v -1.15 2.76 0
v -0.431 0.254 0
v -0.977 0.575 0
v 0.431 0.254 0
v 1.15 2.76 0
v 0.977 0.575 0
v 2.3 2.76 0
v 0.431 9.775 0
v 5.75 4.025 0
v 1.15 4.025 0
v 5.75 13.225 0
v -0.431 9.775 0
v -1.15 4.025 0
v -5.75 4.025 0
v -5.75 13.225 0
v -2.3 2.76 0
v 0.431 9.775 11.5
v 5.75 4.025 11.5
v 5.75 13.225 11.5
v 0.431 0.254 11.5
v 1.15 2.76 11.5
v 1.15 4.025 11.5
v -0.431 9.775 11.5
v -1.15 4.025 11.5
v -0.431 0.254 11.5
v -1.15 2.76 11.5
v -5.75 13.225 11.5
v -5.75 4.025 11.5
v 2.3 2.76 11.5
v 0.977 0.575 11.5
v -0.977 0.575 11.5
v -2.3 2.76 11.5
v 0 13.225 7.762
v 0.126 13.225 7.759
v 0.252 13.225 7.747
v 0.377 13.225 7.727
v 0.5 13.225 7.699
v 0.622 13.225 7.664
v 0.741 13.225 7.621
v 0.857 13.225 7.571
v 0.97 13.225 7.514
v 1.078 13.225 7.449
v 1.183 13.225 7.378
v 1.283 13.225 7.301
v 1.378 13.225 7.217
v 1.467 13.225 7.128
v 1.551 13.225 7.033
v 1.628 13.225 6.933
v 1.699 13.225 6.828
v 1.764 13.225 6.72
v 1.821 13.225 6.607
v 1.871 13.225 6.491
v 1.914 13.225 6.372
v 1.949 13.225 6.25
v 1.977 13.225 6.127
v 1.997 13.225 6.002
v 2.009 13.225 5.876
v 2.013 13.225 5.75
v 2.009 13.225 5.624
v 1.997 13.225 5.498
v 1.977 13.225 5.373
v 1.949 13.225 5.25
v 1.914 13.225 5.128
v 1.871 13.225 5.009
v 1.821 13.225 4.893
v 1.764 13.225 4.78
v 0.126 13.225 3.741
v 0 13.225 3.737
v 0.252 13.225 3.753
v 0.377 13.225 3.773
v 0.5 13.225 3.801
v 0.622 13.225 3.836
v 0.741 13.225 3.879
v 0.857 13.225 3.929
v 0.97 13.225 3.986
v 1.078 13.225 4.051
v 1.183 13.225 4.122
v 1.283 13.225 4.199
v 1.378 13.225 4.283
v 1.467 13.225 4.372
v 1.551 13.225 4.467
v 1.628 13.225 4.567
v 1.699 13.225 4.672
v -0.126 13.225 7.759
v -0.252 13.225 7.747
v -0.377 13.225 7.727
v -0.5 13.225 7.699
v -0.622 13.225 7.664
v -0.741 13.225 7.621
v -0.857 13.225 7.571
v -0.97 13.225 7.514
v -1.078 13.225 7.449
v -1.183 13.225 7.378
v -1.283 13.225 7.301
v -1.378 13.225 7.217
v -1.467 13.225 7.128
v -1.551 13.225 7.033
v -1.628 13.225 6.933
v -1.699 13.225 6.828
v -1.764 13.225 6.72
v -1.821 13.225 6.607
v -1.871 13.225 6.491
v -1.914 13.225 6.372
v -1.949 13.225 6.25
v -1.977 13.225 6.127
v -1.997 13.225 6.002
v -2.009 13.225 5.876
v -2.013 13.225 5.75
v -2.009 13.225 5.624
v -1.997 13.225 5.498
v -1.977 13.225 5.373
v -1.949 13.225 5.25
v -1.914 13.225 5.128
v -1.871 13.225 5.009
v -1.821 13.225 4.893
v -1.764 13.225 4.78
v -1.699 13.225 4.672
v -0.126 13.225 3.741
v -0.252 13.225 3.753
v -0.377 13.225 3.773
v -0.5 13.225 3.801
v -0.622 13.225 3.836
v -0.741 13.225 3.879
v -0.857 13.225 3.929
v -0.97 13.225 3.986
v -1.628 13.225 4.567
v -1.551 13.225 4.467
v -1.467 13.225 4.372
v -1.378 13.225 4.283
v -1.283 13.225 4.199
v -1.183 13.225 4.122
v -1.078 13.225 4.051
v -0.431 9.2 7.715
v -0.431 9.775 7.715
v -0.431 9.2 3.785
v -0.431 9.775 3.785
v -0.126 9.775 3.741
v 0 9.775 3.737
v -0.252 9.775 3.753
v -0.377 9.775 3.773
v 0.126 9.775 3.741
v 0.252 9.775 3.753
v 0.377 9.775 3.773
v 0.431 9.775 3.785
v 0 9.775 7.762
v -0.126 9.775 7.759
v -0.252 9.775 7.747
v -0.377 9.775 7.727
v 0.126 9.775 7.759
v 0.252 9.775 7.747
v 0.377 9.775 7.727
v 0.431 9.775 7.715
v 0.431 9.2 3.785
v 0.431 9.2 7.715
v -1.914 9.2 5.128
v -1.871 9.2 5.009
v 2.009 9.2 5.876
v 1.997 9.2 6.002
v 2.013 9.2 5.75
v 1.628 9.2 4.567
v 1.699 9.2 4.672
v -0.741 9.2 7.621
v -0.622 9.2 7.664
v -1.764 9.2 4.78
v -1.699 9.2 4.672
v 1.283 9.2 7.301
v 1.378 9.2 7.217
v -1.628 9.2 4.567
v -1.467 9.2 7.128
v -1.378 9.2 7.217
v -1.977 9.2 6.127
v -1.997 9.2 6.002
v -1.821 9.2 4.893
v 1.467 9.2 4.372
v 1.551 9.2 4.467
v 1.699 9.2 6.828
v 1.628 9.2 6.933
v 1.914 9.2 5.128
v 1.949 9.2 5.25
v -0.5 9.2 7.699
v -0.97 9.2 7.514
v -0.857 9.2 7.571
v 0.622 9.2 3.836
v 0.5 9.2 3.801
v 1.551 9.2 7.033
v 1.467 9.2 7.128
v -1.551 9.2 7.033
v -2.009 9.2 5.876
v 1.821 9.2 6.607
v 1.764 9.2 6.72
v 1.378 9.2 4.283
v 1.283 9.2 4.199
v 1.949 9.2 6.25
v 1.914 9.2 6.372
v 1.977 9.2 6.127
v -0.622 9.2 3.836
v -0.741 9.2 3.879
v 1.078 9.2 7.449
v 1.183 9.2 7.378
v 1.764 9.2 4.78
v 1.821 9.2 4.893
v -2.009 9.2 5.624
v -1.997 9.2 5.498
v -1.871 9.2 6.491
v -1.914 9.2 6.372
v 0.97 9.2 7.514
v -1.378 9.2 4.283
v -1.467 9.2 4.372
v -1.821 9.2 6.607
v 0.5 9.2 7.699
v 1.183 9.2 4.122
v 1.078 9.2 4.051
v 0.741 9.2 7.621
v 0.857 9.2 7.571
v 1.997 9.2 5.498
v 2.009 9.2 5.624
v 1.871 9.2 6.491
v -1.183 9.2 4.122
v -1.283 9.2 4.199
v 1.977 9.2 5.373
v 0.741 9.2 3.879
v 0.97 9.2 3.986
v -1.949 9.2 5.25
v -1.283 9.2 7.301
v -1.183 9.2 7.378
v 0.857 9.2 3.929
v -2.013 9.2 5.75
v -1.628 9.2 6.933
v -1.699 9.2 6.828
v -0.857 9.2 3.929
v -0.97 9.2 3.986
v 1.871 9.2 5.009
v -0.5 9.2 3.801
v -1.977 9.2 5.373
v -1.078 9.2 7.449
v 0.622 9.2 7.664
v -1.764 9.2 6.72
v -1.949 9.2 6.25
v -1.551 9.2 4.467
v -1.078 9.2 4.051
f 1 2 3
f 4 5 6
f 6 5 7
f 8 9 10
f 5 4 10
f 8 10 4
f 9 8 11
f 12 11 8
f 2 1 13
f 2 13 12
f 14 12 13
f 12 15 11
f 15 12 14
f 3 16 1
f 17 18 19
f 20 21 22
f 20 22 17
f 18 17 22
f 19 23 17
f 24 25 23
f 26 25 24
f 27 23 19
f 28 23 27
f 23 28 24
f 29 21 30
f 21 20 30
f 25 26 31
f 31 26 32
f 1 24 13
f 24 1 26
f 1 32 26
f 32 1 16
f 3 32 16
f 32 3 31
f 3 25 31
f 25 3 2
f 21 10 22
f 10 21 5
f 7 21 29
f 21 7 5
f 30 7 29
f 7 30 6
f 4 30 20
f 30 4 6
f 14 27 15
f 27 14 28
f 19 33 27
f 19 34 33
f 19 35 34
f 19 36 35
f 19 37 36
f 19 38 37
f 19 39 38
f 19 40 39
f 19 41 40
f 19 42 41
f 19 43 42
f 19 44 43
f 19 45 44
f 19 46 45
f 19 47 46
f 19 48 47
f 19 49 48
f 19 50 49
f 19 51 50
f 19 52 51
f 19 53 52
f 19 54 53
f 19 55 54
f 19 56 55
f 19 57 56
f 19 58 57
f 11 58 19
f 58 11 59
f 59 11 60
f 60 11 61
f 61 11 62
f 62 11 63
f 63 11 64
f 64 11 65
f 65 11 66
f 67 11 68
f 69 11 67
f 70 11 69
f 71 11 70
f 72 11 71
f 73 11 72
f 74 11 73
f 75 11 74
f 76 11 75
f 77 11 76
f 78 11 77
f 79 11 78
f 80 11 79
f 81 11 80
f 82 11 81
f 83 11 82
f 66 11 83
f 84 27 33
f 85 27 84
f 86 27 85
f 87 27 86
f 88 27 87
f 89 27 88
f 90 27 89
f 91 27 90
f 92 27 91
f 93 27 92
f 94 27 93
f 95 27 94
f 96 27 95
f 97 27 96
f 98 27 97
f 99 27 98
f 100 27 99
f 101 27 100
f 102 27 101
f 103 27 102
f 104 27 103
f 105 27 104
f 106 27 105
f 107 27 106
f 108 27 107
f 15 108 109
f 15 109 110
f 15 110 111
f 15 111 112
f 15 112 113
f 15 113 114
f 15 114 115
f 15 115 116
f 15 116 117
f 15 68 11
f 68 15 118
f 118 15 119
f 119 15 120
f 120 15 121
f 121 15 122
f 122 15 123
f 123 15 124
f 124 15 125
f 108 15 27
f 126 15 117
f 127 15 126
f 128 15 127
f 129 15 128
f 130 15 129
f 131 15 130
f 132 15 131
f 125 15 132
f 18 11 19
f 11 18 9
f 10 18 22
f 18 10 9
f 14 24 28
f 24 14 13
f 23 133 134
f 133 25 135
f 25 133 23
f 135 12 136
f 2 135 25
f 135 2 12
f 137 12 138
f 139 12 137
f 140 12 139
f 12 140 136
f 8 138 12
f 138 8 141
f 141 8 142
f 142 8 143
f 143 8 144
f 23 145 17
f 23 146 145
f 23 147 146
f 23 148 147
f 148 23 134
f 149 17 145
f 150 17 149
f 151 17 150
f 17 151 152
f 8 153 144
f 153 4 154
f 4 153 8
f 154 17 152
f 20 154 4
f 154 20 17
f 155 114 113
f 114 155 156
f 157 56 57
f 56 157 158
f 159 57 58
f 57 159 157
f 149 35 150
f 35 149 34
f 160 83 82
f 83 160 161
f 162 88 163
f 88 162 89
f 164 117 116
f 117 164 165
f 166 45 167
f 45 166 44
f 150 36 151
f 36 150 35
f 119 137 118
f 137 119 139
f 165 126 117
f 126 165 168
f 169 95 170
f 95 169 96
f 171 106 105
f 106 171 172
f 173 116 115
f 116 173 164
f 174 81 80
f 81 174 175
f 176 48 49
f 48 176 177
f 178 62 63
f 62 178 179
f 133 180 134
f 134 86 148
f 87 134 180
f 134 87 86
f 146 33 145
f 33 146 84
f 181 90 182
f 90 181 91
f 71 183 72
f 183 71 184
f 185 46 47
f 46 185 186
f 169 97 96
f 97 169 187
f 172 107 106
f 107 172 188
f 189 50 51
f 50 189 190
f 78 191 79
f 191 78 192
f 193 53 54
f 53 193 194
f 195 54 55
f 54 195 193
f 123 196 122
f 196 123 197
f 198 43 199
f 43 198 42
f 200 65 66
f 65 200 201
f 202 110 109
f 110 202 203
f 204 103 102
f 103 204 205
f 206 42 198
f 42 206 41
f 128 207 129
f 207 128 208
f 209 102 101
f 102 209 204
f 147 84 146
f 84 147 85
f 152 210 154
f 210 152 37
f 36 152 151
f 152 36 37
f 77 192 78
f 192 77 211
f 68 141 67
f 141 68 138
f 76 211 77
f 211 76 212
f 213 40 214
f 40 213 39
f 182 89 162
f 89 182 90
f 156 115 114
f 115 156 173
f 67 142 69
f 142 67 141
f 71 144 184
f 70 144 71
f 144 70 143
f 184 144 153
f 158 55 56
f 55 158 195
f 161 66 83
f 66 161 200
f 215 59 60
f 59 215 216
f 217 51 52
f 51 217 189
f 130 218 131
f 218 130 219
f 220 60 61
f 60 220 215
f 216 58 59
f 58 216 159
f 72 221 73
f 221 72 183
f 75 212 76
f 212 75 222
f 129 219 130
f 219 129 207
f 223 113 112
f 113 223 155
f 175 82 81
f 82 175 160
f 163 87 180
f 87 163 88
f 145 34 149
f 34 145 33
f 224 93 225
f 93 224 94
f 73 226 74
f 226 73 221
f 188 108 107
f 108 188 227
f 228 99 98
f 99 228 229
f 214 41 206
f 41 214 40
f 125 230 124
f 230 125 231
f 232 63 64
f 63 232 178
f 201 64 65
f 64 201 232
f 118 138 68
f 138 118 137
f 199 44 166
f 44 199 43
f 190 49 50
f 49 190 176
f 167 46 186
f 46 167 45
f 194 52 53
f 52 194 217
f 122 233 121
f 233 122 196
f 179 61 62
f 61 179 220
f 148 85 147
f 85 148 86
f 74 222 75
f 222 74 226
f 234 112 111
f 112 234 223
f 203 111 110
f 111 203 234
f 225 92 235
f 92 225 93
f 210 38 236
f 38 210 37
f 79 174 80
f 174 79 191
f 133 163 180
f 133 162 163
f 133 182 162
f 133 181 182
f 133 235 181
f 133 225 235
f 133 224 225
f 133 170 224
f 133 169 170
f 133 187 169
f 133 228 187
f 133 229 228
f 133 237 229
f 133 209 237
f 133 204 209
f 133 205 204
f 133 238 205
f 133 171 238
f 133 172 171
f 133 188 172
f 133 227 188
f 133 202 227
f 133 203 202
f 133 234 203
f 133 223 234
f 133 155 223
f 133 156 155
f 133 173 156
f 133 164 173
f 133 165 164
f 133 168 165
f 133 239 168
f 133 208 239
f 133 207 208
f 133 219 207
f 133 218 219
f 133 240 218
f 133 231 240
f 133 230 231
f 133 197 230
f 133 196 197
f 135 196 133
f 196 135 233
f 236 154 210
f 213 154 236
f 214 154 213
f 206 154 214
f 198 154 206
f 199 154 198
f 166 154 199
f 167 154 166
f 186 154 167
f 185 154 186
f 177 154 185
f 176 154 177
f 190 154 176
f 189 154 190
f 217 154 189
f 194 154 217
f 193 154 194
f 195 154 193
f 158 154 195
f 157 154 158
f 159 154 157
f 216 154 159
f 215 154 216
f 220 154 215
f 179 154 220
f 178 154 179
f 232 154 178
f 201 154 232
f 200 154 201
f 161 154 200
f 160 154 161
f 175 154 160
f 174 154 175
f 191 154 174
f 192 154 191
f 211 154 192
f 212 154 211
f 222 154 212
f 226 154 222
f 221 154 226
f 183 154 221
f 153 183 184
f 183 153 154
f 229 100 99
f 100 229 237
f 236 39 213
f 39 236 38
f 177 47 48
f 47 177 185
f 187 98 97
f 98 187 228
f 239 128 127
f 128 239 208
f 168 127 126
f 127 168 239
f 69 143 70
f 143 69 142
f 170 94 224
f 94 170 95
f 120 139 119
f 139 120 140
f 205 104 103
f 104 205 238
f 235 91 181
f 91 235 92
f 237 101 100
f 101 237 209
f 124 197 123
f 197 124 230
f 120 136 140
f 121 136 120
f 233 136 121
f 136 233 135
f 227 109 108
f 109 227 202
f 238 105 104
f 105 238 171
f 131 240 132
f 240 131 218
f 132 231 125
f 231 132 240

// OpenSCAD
/*
Dual 5015 Fan Mount for Voron 0.1
Design by Greg Huber, Greg's Maker Corner 

Purpose: Provide additional cooling, which will be helpful for many reasons including:
    - PLA, TPU, 
    - Faster printing in general 
Goal: Printable on Voron 0.1, easily add after building (no square nuts required)
Supplies needed: 
    - 2 small m5 heat inserts (same kind as used during Voron assembly)
    - 2 M3x12mm socket head screws
    - 2 5015 fans. I used these: https://amzn.to/2ZfxumB
    - Not recommended to wire to SKR e3 v2 fan connection, due to small MOSFETS which may burn out
    - Option 1: Klipper Extender if you want to control fans
    - Option 2: Wire directly to PSU and put a small switch inline to turn on manually at 100%   
*/

//Duct: should fan out to 120mm, covering entire span of build volume
//Need 30mm of clearance from side

$fn=100; 
h=10; //height of fan body

module fanout()
{
            translate([-7,0,0])
            linear_extrude(h)
            polygon(points=[[0,-2], [-60,17], [-60,25], [74,25], [74,17], [14,-2]], paths=[[0,1,2,3,4,5]]);        
    
            difference(){
                translate([0,7,0])
                linear_extrude(h)
                square([134,20], center=true);            
                
                //m3 screw cut outs                
                 translate([-61.25,2.75,5])
                 cylinder(h=h, r=3.4/2, center=true);
                 
                 translate([61.25,2.75,5])
                 cylinder(h=h, r=3.4/2, center=true);

                //cap head recess cutouts                    
                 translate([-61.25,2.75,9.1])
                 cylinder(h=3, r=5.8/2, center=true);
                 
                 translate([61.25,2.75,9.1])
                 cylinder(h=3, r=5.8/2, center=true);

             }
}

module brace(l,ang)
{
    rotate([0,0,ang])
    linear_extrude(h)
    square([l,1.5], center=true);
}

module duct()
{

    difference()
    {
        fanout();
        translate([0,7.1,2])
        scale([.90, .75, .4]) fanout(); //duct cutout

        //Cutout for 5015 fan: 19x15mm
        translate([0,11,5])
        linear_extrude(h)
        square([19.25,15], center=true);

        //front nub of fan 
        translate([10,11,8.1])
        cylinder(h=4,r=2/2,center=true);        
    }
 
    //brace spacing from front
    y1=21.75;
    y2=20.25;
  
    //create braces    
    translate([45,y1,0])
    brace(10,30);    

    translate([-45,y1,0])
    brace(10,-30);    

    translate([25,y2,0])
    brace(20,23);    

    translate([-25,y2,0])
    brace(20,-23);    

    translate([10,y1,0])
    brace(11.75,25);    

    translate([-10,y1,0])
    brace(11.75,-25);    
}


//Assume opening for extrusion is 3.4 (+/- .2)mm wide, 1.1 mm lip, 4mm depth, and ~5.8mm internal
//Refer to https://us.misumi-ec.com/vona2/detail/110300465870/

cliph=10; //thickness of clip

//generates the clip profile to fit into 1515 extrusion (left side- is later mirrored)
module clip_profile()
{
    linear_extrude(cliph)
    polygon(points=[[0,0], [-.85,.5], [-2,2.4], [-1,2.4], [-1,7], [0,7], [0,0]], paths=[[0,1,2,3,4,5,6]]);
}

module clip()
{
    
    scale([1.15, 1.15, 1.15]) //account for ABS shrinkage
    {

        difference()
            {
            union(){
                clip_profile();
                mirror([1,0,0]) clip_profile();
                
            //base against 1515
                translate([0, 7.5, 0])
                linear_extrude(cliph)
                square([10,8], center=true);
                }

            //cut out for squeezing 
            translate([0, 4, 0])
            linear_extrude(cliph + .1)        
            square([.75,9], center=true);      
            
            //m5 heat insert cutout (??)
            translate([0,10,5])
            rotate([90,0,0])
            cylinder(r=3.5/2, h=4, center=true);
                
            }
      }    
}


//Generates a "full body" assembled view. 
module fullbody(a1,a2,a3)
{
    
//Generate full Model

    rotate([a1,a2,a3])
    {
        //Generate Duct
        translate([0,0,10])
        rotate([180,0,0])
        duct();

        translate([-55.5,-2.75,23])
        rotate([-90,0,90])
        clip();

        translate([67,-2.75,23])
        rotate([-90,0,90])
        clip();
    }

}

//Generates a printable view of just the fan part.
module printbody(a1,a2,a3)
{
    
//Generate full Model

    rotate([a1,a2,a3])
    {
        //Generate Duct
        translate([0,0,10])
        rotate([180,0,0])
        duct();
    }

}

//Comment / Uncomment to generate each component. Rotate as needed. 

//fullbody(0,0,0);
//printbody(90,0,45);
clip();
   
